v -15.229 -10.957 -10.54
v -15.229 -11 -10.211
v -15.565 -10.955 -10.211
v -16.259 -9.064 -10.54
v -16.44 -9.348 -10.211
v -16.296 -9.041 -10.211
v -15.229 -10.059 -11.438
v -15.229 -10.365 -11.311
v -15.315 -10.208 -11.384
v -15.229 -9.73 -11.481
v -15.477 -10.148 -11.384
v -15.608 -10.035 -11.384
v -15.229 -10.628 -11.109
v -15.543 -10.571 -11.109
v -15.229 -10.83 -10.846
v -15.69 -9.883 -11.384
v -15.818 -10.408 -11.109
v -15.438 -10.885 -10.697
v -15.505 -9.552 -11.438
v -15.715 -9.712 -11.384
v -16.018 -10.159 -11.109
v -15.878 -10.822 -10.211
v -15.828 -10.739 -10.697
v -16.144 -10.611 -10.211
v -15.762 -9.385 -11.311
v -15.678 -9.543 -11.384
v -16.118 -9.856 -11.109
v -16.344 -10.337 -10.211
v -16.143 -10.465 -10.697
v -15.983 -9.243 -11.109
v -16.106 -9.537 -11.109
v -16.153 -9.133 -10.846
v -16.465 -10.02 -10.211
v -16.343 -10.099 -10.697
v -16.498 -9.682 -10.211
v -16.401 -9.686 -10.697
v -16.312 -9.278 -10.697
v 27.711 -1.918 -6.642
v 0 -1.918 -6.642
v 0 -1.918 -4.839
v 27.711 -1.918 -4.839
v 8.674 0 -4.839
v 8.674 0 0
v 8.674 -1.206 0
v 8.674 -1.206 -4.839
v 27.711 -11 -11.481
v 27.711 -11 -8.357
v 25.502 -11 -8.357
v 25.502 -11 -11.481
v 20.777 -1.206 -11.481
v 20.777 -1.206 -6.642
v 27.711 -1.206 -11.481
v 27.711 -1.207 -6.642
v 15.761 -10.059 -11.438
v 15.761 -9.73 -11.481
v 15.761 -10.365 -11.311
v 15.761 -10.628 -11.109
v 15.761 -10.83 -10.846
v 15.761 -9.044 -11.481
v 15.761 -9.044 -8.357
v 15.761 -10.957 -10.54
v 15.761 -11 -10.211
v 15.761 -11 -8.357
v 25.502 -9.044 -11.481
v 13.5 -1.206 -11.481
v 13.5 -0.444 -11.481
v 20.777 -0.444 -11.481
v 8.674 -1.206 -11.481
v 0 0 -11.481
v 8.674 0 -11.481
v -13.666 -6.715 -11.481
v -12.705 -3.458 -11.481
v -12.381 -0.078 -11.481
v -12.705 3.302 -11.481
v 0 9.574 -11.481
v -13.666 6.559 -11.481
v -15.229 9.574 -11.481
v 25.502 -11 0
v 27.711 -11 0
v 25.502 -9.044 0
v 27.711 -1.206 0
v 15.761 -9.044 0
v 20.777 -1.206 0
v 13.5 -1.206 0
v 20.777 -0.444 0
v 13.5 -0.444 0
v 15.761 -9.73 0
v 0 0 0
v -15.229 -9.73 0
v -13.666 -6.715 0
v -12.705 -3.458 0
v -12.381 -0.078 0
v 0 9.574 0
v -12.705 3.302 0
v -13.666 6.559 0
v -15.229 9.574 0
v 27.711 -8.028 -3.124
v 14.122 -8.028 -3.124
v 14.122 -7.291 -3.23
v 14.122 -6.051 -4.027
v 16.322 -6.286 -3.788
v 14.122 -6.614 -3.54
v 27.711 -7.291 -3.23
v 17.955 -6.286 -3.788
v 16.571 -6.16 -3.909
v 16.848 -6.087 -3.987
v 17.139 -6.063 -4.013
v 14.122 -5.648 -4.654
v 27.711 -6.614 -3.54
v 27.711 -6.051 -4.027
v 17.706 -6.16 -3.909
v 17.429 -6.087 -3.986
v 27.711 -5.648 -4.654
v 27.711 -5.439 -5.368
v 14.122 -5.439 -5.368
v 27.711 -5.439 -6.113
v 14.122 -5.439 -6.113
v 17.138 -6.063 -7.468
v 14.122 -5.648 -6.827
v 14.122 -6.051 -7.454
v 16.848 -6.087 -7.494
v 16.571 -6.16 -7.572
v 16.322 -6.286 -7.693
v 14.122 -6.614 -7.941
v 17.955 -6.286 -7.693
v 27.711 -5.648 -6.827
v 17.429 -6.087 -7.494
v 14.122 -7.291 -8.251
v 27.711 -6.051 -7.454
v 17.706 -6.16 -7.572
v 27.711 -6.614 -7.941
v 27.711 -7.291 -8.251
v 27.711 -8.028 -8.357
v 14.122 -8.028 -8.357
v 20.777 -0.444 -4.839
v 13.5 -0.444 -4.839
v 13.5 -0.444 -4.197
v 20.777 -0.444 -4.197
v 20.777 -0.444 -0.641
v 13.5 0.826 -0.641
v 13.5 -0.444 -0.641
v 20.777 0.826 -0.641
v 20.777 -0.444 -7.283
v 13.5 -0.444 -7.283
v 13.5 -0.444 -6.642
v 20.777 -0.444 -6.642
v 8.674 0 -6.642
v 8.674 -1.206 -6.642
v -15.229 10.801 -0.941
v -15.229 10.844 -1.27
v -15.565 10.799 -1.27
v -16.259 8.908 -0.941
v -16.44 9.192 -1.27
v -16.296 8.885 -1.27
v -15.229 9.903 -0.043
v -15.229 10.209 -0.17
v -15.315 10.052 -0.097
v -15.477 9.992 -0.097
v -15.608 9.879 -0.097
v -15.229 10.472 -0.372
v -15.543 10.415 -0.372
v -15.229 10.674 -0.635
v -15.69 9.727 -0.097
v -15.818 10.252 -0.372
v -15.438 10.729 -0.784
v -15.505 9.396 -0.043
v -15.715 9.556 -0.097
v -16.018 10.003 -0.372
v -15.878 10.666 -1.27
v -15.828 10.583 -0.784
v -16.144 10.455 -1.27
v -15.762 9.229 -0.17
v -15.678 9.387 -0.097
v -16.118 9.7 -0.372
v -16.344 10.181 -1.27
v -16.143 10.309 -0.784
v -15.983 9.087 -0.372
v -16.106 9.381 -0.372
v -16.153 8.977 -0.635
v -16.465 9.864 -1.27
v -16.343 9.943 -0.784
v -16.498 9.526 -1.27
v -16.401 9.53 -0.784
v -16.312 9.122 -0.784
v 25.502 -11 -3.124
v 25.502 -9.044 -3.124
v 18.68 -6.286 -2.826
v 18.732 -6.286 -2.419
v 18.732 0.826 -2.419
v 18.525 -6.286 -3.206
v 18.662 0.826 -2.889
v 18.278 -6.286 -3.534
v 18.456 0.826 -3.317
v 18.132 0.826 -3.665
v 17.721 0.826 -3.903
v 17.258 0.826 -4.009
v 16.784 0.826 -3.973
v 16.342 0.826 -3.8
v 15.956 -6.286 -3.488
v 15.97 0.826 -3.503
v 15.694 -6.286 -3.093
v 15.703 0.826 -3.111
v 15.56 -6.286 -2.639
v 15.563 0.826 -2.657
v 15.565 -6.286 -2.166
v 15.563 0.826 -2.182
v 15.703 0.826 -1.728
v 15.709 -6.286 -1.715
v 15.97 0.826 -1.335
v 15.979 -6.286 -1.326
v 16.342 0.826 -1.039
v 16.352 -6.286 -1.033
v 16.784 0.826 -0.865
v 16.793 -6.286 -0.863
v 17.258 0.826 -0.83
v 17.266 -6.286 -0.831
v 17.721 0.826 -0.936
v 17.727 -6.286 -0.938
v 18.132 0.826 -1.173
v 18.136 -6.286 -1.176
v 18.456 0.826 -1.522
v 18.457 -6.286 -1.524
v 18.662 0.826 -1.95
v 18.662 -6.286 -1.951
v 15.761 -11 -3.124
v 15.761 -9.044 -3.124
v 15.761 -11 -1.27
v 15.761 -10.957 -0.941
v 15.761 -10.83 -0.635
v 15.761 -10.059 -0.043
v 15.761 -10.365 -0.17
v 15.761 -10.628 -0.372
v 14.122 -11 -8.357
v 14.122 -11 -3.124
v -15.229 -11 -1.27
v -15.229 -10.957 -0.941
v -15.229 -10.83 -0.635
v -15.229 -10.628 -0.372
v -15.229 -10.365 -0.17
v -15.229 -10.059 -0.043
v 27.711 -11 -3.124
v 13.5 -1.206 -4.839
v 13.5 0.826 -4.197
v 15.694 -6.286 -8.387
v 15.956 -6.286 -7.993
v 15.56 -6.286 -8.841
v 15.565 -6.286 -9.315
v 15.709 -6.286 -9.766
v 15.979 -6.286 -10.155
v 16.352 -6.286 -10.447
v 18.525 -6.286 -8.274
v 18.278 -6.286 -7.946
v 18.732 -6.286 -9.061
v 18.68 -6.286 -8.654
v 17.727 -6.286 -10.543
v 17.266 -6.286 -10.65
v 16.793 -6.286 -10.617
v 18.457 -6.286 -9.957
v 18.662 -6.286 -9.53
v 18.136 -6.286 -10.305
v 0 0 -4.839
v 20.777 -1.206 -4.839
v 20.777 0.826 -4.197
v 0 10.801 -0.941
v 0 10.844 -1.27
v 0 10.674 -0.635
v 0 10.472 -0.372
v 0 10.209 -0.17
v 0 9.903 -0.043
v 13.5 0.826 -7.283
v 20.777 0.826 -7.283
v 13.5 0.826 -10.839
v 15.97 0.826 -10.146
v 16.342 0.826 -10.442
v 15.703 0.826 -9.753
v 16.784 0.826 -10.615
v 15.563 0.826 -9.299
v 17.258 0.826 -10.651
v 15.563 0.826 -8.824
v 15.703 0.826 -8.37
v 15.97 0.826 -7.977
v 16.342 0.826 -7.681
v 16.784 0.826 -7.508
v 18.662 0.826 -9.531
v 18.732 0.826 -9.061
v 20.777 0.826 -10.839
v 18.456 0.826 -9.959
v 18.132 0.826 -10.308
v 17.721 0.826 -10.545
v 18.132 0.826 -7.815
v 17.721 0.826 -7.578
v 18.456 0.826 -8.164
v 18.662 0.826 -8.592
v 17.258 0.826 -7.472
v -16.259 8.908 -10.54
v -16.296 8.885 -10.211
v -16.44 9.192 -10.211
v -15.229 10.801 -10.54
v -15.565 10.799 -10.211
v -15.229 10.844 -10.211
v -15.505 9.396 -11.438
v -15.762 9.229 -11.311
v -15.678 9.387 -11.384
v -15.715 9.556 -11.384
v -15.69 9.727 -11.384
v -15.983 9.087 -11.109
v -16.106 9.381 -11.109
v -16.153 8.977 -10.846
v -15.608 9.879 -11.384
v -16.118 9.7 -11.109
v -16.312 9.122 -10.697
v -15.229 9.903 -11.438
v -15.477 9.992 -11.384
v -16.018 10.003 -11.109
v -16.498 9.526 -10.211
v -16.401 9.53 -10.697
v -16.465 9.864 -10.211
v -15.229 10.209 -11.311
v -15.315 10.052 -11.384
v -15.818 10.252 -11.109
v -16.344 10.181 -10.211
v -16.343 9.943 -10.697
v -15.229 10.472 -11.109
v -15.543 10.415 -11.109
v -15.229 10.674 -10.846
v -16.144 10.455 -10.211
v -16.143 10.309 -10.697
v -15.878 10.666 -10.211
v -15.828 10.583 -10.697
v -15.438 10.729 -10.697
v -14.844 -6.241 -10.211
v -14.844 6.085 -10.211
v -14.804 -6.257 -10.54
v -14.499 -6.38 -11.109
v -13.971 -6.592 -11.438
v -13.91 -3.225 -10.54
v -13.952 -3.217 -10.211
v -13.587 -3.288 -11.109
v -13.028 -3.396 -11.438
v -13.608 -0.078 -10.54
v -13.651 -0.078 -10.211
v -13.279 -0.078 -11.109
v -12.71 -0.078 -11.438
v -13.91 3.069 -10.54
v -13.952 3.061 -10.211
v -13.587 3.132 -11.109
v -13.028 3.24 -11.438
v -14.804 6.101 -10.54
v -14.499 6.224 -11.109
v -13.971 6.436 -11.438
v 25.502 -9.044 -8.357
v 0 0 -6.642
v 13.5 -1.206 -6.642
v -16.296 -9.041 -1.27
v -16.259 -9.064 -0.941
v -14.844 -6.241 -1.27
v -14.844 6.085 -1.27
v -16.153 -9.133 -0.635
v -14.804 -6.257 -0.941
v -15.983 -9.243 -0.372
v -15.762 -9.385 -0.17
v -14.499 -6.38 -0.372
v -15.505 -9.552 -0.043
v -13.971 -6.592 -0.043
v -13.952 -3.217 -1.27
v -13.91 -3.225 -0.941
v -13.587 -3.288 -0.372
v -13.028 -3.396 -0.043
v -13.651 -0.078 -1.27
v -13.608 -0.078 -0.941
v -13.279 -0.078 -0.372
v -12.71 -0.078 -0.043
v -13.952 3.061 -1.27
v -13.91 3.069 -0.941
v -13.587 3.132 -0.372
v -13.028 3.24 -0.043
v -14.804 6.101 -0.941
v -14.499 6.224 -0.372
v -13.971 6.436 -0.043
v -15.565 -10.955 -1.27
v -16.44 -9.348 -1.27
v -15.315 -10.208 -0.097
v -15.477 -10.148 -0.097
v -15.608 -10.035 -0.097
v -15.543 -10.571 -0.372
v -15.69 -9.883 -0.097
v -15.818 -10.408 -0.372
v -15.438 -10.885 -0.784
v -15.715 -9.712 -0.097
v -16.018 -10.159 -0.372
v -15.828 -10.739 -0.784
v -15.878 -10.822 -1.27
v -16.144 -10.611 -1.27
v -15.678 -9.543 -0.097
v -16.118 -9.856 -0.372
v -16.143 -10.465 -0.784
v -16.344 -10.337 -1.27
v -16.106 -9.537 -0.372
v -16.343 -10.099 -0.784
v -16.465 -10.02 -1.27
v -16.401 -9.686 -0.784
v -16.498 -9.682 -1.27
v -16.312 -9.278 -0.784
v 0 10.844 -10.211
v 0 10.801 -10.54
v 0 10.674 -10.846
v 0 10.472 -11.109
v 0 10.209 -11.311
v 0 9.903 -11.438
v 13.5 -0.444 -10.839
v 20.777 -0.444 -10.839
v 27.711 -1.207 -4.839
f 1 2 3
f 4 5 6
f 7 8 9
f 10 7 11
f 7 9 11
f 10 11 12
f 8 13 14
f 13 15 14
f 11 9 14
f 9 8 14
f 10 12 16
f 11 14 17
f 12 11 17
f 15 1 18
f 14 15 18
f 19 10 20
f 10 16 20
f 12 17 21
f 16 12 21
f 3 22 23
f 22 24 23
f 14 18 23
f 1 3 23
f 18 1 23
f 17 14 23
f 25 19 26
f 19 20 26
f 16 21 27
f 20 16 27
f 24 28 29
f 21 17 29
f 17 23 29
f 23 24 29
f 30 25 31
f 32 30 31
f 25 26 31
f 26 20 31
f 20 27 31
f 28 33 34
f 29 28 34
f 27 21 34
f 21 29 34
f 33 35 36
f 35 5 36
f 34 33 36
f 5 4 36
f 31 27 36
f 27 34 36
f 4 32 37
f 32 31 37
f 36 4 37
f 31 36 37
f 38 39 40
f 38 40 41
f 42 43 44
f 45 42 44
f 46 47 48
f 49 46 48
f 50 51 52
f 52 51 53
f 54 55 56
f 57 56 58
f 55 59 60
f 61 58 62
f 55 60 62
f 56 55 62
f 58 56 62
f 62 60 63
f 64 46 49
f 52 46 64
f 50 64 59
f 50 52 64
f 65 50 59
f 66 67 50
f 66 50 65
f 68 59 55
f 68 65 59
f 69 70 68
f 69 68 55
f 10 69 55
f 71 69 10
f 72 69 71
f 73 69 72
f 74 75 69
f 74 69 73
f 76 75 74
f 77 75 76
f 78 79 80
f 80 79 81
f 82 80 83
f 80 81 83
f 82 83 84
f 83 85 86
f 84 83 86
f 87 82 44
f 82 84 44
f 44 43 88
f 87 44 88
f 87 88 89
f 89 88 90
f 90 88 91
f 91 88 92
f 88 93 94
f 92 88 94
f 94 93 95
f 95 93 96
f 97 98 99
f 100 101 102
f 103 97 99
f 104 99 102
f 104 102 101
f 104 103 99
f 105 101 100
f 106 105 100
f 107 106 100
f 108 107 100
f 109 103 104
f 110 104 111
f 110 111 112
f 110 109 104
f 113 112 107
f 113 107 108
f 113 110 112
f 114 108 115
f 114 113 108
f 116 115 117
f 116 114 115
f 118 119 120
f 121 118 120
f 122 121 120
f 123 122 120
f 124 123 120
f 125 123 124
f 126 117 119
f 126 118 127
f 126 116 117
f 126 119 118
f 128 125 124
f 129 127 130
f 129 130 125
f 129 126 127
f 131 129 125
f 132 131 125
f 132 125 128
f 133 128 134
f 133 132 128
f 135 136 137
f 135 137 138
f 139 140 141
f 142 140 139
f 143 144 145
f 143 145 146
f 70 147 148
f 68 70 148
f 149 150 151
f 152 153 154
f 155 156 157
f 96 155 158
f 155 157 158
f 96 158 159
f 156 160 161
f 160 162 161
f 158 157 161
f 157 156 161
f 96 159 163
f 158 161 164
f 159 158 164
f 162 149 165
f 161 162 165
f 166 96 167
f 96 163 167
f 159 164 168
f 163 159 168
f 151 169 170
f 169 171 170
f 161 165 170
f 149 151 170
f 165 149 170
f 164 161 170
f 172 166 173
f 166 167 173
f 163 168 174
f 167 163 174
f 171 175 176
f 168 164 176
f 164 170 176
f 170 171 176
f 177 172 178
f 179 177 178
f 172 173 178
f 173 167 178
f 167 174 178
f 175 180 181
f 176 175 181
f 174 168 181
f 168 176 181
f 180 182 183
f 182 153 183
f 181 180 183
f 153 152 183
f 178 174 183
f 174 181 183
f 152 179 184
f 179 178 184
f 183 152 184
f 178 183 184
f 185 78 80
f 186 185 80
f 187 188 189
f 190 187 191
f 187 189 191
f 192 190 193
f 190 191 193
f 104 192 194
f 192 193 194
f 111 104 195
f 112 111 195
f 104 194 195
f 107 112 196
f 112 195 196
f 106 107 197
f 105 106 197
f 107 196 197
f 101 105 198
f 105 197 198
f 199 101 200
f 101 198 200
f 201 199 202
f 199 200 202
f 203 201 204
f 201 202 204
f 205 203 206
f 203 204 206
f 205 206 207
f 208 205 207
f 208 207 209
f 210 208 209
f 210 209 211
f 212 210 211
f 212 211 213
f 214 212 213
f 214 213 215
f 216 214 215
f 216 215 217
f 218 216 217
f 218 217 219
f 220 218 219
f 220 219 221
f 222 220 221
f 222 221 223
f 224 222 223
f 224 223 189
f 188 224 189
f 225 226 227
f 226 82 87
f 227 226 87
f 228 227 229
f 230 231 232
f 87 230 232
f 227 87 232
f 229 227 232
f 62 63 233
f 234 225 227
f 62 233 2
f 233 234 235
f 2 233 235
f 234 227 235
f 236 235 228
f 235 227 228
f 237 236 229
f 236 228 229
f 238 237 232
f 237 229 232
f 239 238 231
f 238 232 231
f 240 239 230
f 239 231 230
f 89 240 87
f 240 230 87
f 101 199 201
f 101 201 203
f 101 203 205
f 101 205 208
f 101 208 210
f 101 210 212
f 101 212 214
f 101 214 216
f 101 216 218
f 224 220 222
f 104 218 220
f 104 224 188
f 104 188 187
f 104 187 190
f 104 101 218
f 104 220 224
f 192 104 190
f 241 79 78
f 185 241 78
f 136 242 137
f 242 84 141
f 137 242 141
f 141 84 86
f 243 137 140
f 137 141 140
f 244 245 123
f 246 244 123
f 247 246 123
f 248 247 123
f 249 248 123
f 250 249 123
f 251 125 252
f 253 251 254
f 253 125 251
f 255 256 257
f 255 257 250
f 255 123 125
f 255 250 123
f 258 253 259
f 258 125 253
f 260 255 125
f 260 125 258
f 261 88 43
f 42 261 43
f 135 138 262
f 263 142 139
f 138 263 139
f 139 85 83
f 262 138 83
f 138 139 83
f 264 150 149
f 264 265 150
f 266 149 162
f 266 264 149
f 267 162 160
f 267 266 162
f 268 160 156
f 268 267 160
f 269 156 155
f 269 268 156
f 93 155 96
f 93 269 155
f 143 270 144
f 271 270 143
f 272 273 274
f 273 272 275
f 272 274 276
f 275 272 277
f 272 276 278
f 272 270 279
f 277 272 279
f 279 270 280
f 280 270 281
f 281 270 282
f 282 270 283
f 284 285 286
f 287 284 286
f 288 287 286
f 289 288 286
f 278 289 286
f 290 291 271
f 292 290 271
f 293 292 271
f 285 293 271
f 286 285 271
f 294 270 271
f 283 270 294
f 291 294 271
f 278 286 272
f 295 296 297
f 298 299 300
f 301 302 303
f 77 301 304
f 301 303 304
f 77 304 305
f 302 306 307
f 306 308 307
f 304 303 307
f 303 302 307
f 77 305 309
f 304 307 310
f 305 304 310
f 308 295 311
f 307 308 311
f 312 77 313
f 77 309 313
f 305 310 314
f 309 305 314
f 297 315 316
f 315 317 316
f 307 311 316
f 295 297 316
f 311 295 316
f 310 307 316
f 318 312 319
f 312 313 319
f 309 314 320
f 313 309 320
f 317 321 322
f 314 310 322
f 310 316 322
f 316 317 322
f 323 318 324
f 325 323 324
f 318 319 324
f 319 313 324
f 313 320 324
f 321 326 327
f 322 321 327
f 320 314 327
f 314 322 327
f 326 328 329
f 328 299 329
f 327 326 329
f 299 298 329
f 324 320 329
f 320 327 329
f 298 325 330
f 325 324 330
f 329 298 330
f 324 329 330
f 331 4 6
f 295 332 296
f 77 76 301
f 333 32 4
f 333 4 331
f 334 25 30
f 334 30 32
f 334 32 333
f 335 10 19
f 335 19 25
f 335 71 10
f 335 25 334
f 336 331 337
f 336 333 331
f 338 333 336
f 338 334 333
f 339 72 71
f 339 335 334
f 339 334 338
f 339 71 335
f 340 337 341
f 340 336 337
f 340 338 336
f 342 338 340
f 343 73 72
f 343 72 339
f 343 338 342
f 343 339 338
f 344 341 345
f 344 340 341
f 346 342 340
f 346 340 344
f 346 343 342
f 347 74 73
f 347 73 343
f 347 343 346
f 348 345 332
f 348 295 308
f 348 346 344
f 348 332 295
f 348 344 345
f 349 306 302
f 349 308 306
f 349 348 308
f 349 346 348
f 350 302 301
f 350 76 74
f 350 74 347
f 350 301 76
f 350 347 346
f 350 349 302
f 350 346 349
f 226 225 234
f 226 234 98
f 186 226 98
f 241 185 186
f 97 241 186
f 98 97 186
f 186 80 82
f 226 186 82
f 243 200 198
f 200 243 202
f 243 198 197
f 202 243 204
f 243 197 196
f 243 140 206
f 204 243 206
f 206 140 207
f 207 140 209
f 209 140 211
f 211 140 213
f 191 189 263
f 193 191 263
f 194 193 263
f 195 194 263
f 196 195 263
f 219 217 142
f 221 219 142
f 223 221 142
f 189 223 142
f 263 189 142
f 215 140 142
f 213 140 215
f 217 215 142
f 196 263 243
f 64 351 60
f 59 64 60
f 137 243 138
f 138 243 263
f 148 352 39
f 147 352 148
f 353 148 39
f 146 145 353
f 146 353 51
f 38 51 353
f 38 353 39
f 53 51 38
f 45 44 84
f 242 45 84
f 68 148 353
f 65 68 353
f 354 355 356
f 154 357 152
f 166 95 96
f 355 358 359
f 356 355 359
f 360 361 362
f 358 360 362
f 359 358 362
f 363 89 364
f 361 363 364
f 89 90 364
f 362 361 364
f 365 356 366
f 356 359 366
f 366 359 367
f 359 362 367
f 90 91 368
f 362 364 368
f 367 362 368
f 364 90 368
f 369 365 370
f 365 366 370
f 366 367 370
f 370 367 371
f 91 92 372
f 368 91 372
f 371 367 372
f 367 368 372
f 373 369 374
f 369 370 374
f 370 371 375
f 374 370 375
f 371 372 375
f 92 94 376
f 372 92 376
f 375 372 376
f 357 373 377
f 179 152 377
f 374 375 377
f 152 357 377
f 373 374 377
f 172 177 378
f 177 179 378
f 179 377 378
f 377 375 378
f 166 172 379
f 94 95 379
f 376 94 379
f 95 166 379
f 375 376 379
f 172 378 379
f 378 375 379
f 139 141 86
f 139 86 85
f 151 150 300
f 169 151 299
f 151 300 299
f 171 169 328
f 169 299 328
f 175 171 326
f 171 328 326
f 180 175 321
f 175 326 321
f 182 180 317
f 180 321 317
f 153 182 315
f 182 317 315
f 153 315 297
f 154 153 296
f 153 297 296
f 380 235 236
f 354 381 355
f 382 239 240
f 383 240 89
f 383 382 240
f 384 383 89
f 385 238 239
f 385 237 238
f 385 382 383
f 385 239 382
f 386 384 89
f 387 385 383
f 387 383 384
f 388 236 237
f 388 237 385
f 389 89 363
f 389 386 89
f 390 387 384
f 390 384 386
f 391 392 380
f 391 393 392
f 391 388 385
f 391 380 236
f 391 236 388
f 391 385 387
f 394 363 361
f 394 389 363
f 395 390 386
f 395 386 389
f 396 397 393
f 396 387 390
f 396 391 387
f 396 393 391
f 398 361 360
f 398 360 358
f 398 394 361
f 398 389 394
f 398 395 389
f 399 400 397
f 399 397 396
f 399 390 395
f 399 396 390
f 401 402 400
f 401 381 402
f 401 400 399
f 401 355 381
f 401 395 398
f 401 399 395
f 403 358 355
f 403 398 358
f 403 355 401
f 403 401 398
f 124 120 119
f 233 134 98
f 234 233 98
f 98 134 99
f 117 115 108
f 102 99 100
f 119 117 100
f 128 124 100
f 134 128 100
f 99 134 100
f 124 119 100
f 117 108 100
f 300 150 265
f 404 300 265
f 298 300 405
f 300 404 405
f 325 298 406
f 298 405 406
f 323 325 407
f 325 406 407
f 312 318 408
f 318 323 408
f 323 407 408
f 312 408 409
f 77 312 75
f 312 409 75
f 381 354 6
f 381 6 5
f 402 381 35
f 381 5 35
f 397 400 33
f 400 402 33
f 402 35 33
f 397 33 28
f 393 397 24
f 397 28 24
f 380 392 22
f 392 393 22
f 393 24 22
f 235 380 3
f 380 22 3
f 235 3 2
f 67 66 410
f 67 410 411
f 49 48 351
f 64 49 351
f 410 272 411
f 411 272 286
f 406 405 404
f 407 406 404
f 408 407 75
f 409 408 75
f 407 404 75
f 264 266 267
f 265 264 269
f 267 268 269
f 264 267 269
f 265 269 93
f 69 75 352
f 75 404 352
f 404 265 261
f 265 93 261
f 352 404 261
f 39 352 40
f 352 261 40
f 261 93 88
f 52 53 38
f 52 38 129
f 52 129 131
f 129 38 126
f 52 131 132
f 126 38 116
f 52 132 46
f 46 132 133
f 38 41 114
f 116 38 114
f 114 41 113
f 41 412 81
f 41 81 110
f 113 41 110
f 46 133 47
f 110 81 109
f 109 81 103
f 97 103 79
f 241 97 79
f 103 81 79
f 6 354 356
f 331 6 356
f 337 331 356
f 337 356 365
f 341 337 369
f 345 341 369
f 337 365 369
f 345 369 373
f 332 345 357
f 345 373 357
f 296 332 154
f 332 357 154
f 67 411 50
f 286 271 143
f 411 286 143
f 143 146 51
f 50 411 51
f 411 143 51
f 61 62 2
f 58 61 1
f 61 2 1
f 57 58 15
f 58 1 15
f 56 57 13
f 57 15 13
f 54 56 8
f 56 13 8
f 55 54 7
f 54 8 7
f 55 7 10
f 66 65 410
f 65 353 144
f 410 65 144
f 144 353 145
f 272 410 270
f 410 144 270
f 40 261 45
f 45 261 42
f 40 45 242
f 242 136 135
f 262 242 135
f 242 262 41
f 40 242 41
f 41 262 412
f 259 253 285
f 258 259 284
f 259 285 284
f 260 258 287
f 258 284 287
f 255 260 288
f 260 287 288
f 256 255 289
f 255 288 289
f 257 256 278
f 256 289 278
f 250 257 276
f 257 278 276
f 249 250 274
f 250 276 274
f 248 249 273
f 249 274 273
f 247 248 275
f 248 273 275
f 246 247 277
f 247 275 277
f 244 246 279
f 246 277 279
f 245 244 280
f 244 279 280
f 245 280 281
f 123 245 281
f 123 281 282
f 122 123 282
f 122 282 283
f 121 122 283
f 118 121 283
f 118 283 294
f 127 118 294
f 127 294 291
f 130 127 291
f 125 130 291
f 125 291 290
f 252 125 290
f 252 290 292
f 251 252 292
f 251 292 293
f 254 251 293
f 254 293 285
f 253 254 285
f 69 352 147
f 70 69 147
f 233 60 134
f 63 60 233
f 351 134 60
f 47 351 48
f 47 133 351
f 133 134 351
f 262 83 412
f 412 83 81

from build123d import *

# Parameters (mm, degrees)
BOSS_EXTRUDE1_DEPTH = 11.4808
SKETCH2_W           = 27.7114
SKETCH2_H           = 1.8034
CUT_EXTRUDE1_DEPTH  = 2.7432
SKETCH3_R           = 1.59385
CUT_EXTRUDE2_DEPTH  = 7.112
BOSS_EXTRUDE2_DEPTH = 11.4808
FILLET1_R           = 1.27
SKETCH5_W           = 7.2771
SKETCH5_H           = 0.64135
CUT_EXTRUDE3_DEPTH  = 1.27
CUT_EXTRUDE4_DEPTH  = 13.589


with BuildPart() as part:
    # Sketch1 → Boss-Extrude1 (new body)
    with BuildSketch(Plane.XY):
        Polygon((0, 0), (8.6741, 0), (8.6741, -1.2065), (13.5001, -1.2065), (13.5001, 0.8255), (20.7772, 0.8255), (20.7772, -1.2065), (27.7114, -1.2065), (27.7114, -11), (25.5016, -11), (25.5016, -9.0442), (15.7607, -9.0442), (15.7607, -11), (0, -11), align=None)
    extrude(amount=-BOSS_EXTRUDE1_DEPTH)

    # Sketch2 → Cut-Extrude1 (cut)
    with BuildSketch(Plane(origin=(0, 0.8255, 0), x_dir=(1, 0, 0), z_dir=(0, 1, 0))):
        with Locations((13.8557, 5.7404)):
            Rectangle(SKETCH2_W, SKETCH2_H)
    extrude(amount=-CUT_EXTRUDE1_DEPTH, mode=Mode.SUBTRACT)

    # Sketch3 → Cut-Extrude2 (cut)
    with BuildSketch(Plane(origin=(0, 0.8255, 0), x_dir=(1, 0, 0), z_dir=(0, 1, 0))):
        with Locations((17.13865, 9.06145)):
            Circle(SKETCH3_R)
        with Locations((17.13865, 2.41935)):
            Circle(SKETCH3_R)
    extrude(amount=-CUT_EXTRUDE2_DEPTH, mode=Mode.SUBTRACT)

    # Sketch4 → Boss-Extrude2 (add)
    with BuildSketch(Plane.XY):
        with BuildLine():
            Line((0, 10.844), (0, -11))
            Line((0, -11), (-17.78, -11))
            ThreePointArc((-17.78, -11), (-13.651034529, -0.078), (-17.78, 10.844))
            Line((-17.78, 10.844), (0, 10.844))
        make_face()
    extrude(amount=-BOSS_EXTRUDE2_DEPTH)

    # Fillet1
    fillet1_edges = [part.edges().sort_by_distance(p)[0] for p in [
        (-1.00965, -11, 0),
        (-1.00965, -11, -11.4808),
        (-8.89, 10.844, 0),
        (-13.651034529, -0.078, 0),
        (-13.651034529, -0.078, -11.4808),
        (-17.78, -11, -5.7404),
        (-8.89, 10.844, -11.4808),
        (-17.78, 10.844, -5.7404),
    ]]
    fillet(fillet1_edges, radius=FILLET1_R)

    # Sketch5 → Cut-Extrude3 (cut)
    with BuildSketch(Plane(origin=(0, 0.8255, 0), x_dir=(1, 0, 0), z_dir=(0, 1, 0))):
        with Locations((17.13865, 6.962775)):
            Rectangle(SKETCH5_W, SKETCH5_H)
        with Locations((17.13865, 11.160125)):
            Rectangle(SKETCH5_W, SKETCH5_H)
        with Locations((17.13865, 0.320675)):
            Rectangle(SKETCH5_W, SKETCH5_H)
        with Locations((17.13865, 4.518025)):
            Rectangle(SKETCH5_W, SKETCH5_H)
    extrude(amount=-CUT_EXTRUDE3_DEPTH, mode=Mode.SUBTRACT)

    # Sketch6 → Cut-Extrude4 (cut)
    with BuildSketch(Plane(origin=(27.7114, 0, 0), x_dir=(0, 0, -1), z_dir=(1, 0, 0))):
        with BuildLine():
            Line((3.1242, -11), (3.1242, -8.0282))
            ThreePointArc((3.1242, -8.0282), (5.7404, -5.412), (8.3566, -8.0282))
            Line((8.3566, -8.0282), (8.3566, -11))
            Line((8.3566, -11), (3.1242, -11))
        make_face()
    extrude(amount=-CUT_EXTRUDE4_DEPTH, mode=Mode.SUBTRACT)


solid = part.part
